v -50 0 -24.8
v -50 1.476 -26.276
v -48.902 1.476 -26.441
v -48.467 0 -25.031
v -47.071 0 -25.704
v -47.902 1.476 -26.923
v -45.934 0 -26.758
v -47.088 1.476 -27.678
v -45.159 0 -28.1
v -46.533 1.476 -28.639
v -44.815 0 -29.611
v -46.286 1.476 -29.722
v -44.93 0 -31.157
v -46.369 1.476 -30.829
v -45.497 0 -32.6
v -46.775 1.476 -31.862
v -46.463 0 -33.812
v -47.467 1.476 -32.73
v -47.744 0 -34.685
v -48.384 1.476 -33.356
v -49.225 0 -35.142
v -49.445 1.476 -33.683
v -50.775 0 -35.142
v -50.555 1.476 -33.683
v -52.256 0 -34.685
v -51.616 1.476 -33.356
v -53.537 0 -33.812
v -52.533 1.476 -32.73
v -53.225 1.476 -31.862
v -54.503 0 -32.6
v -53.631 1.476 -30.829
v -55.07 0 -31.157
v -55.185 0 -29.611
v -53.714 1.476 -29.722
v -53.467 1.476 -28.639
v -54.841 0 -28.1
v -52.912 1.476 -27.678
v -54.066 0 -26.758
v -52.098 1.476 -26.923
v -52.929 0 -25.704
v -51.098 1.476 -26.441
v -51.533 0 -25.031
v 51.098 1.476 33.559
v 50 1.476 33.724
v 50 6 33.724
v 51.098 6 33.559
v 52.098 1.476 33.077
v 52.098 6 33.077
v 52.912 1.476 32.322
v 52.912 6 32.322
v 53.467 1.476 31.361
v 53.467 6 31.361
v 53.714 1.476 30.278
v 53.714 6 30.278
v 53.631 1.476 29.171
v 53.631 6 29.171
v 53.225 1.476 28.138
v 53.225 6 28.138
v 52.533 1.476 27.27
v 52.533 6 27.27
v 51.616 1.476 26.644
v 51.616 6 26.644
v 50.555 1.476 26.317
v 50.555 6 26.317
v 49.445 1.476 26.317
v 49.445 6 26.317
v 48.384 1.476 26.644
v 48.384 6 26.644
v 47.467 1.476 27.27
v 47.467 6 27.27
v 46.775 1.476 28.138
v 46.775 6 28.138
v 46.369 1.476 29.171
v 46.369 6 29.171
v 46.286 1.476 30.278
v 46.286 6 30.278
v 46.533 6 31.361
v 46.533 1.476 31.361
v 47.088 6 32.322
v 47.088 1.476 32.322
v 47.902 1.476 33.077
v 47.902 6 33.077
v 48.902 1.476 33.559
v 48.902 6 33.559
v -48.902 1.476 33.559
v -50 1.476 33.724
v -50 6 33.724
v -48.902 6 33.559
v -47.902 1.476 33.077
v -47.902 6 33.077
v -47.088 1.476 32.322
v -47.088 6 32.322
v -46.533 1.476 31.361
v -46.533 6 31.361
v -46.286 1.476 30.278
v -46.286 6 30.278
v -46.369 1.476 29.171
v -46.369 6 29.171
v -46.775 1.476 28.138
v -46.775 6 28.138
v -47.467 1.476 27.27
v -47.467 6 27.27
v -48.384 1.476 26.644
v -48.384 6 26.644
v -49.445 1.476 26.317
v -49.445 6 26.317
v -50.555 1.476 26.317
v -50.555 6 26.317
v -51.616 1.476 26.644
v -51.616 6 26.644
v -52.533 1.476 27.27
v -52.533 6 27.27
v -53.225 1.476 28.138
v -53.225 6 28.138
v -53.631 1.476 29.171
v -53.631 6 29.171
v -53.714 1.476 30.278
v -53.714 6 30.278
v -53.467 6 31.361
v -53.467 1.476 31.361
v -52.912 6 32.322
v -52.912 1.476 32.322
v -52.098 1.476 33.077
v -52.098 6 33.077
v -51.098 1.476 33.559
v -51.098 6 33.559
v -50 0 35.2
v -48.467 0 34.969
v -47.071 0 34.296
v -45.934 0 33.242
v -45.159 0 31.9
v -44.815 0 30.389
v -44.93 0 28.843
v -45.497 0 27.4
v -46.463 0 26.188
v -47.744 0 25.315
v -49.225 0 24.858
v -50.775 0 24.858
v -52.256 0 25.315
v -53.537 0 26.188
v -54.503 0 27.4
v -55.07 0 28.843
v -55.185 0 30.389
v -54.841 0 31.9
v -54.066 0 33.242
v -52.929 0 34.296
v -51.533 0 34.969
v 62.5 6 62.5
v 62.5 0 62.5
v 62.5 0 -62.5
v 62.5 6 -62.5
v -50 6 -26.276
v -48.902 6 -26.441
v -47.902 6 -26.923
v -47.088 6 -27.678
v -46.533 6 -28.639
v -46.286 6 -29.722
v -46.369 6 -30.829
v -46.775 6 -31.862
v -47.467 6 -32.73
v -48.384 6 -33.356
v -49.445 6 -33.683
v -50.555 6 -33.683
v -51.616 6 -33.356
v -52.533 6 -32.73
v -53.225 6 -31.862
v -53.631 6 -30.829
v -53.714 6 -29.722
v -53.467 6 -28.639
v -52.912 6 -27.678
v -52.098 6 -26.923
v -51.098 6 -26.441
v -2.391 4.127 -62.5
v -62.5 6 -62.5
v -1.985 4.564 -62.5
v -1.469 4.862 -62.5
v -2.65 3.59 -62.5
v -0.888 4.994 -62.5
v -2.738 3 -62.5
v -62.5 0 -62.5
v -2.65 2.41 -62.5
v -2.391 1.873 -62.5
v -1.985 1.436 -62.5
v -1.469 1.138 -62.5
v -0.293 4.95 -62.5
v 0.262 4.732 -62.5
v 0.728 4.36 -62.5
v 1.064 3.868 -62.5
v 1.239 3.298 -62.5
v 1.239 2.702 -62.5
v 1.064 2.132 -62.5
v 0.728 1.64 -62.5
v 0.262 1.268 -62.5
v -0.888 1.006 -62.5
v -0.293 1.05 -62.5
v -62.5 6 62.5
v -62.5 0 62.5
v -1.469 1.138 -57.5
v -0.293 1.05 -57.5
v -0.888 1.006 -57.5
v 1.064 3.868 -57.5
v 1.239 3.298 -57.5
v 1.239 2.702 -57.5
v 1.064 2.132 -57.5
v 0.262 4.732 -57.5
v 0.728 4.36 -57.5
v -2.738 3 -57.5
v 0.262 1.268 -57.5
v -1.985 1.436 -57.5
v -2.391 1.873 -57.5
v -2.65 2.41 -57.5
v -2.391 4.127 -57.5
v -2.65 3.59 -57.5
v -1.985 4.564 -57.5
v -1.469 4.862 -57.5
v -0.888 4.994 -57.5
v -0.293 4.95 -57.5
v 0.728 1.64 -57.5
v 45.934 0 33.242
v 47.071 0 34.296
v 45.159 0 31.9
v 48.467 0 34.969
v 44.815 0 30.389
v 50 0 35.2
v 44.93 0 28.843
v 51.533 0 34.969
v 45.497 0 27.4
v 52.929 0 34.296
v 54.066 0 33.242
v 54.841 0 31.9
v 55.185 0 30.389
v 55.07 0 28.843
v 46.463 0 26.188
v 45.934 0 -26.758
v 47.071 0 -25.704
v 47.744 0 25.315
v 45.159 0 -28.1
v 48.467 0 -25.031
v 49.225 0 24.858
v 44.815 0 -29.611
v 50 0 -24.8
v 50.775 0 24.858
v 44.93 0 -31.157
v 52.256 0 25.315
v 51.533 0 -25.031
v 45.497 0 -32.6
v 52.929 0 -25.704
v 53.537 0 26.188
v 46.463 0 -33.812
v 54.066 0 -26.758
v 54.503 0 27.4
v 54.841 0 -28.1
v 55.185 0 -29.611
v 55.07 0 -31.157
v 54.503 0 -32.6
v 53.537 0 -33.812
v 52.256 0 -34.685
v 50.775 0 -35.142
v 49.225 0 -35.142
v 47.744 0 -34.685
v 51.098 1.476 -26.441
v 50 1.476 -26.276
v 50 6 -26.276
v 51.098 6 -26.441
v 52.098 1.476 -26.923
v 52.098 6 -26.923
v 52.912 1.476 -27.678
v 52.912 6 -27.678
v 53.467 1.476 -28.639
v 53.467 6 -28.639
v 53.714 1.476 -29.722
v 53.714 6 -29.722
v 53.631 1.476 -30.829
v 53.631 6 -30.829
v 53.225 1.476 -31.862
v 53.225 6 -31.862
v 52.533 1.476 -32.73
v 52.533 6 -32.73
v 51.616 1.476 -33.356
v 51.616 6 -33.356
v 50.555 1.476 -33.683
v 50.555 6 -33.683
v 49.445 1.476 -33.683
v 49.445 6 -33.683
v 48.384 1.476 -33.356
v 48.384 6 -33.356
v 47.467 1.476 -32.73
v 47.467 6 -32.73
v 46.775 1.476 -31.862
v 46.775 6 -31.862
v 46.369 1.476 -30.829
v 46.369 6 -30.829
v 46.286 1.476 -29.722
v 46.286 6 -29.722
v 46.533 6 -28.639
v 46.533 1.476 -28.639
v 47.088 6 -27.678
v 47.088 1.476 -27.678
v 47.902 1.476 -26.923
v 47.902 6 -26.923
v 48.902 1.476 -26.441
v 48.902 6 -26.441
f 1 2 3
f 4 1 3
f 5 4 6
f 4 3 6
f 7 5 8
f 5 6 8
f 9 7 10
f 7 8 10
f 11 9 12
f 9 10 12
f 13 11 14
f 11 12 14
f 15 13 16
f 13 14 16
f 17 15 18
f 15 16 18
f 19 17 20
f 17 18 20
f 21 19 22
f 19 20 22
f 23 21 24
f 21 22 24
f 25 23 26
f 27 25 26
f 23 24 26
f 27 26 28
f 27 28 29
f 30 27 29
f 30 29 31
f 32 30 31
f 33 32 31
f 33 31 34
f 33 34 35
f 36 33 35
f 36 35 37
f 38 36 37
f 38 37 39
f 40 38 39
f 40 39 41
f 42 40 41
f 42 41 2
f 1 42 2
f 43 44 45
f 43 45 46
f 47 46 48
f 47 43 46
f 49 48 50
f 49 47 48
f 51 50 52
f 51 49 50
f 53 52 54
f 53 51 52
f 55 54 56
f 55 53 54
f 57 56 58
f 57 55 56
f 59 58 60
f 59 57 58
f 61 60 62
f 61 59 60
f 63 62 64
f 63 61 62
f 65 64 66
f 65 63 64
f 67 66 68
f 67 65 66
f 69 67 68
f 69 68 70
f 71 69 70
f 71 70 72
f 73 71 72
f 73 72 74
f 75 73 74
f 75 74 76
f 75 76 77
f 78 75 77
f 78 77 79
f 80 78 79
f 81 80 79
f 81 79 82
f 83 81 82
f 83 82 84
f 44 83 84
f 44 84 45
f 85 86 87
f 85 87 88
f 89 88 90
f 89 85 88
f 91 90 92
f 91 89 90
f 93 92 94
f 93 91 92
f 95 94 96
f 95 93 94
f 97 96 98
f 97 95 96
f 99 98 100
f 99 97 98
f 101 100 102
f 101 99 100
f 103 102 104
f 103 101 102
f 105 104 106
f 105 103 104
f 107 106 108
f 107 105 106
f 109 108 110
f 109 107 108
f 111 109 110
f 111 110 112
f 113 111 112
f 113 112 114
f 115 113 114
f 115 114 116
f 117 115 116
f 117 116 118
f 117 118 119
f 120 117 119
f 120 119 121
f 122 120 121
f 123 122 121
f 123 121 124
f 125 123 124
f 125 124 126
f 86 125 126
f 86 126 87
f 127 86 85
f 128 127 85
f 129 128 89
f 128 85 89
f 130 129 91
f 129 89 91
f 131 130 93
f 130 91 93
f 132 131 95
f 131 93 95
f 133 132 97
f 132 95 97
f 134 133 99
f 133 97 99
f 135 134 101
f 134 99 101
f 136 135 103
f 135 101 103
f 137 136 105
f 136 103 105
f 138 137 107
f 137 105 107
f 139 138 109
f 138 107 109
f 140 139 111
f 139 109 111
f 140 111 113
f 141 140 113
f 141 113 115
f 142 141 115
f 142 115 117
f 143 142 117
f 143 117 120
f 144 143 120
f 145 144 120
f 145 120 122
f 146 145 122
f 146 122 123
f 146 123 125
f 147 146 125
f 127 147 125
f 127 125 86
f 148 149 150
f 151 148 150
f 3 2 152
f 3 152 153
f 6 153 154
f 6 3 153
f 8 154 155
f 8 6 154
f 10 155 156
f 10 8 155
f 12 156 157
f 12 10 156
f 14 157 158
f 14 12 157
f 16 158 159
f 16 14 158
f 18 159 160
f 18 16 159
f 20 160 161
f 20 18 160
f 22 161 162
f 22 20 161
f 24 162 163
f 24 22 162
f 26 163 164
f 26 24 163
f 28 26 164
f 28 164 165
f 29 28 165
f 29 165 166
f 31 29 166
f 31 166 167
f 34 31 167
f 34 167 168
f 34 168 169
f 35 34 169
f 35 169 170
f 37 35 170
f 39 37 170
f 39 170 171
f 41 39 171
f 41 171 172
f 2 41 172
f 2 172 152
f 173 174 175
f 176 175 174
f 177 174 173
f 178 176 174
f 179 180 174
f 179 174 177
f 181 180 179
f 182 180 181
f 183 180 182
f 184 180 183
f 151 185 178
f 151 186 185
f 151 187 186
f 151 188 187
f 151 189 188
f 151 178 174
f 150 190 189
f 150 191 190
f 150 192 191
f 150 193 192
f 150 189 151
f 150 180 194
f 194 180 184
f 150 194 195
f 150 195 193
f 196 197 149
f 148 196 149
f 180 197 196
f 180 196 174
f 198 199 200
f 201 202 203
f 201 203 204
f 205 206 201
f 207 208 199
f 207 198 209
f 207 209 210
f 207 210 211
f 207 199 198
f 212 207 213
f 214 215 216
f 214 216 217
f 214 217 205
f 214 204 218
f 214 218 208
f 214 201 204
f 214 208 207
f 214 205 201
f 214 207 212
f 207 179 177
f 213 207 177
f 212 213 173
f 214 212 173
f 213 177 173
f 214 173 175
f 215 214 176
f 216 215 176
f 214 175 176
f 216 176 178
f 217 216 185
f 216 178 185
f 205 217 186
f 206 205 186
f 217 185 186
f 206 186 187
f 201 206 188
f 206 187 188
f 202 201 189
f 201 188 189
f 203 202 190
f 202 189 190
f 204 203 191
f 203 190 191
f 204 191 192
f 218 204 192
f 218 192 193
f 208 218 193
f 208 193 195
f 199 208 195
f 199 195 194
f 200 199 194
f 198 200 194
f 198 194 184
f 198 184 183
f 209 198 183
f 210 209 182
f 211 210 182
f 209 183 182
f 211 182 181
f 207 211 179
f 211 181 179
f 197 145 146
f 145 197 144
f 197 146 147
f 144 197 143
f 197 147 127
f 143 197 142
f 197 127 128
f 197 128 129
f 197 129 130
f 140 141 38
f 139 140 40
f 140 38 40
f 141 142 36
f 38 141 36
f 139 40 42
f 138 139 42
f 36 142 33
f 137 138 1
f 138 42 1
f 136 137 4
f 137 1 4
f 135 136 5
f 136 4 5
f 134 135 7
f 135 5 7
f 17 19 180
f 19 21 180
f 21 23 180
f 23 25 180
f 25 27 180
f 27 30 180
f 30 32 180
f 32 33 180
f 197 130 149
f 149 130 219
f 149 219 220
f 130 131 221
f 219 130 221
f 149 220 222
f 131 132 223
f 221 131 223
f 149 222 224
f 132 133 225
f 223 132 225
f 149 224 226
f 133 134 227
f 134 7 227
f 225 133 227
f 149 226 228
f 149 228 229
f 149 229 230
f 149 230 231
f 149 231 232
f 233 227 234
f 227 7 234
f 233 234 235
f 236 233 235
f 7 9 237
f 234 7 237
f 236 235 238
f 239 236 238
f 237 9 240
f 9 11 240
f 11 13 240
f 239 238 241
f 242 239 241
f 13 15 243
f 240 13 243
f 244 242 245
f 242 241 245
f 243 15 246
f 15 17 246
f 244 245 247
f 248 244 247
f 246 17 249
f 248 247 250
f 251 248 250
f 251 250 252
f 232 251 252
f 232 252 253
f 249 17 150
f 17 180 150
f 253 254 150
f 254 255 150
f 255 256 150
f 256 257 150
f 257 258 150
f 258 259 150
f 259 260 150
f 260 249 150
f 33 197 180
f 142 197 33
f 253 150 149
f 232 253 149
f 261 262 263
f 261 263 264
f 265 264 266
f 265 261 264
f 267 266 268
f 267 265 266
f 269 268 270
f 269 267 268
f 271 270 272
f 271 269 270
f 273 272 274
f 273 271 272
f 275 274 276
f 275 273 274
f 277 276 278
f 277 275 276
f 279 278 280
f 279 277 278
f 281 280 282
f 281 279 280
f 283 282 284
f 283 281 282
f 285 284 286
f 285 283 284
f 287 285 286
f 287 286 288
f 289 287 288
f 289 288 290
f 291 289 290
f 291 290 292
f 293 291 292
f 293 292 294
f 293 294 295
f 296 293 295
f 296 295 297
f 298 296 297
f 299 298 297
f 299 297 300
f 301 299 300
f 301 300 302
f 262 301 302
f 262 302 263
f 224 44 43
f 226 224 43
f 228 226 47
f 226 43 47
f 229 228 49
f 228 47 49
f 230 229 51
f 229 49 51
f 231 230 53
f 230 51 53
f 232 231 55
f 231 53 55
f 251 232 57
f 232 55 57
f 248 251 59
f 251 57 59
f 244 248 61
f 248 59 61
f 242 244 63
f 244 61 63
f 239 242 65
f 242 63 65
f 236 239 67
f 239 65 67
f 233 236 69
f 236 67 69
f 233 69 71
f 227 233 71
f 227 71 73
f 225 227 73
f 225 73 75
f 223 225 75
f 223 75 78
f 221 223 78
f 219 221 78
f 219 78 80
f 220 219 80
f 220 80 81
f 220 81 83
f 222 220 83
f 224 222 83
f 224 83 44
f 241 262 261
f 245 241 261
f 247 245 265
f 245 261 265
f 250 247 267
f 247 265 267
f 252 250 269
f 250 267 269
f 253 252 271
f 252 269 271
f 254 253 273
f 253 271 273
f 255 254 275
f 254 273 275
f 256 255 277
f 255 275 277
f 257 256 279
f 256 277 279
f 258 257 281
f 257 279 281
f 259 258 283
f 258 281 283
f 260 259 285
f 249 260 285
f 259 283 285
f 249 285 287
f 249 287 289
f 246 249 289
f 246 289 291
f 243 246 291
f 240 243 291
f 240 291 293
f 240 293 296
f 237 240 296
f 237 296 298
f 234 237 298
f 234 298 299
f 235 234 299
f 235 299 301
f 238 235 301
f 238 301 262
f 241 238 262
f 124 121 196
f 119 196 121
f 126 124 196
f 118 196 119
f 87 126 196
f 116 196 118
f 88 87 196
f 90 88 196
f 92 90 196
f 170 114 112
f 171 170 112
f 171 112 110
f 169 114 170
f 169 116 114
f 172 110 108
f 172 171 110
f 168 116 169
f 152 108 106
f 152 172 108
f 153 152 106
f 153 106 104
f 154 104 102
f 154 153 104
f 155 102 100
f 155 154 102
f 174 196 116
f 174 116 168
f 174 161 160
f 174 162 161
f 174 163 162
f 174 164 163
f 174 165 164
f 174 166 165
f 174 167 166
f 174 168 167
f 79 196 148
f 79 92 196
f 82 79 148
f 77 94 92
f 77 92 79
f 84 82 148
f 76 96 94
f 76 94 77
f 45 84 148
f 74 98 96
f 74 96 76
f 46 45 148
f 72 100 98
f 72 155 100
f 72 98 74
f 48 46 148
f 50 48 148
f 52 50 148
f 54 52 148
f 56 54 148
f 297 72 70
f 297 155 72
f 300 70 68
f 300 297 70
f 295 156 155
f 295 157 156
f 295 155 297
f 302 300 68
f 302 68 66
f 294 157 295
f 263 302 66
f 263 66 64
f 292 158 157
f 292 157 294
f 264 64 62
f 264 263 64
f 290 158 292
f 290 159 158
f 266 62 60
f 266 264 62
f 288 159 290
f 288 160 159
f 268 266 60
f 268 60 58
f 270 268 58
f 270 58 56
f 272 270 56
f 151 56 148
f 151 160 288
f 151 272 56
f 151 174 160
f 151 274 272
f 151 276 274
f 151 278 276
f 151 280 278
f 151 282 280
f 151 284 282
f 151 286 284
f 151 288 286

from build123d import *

# Parameters (mm, degrees)
SKETCH1_W                                       = 125
SKETCH1_H                                       = 125
SKETCH1_R                                       = 3.724428854
BOSS_EXTRUDE2_DEPTH                             = 6
SKETCH3_R                                       = 2
CUT_EXTRUDE1_DEPTH                              = 5
CSK_FOR_M5_FLAT_HEAD_MACHINE_SCREW1_D           = 5.8
CSK_FOR_M5_FLAT_HEAD_MACHINE_SCREW1_DEPTH       = 6
CSK_FOR_M5_FLAT_HEAD_MACHINE_SCREW1_CSINK_D     = 10.4
CSK_FOR_M5_FLAT_HEAD_MACHINE_SCREW1_CSINK_ANGLE = 90
CSK_FOR_M5_FLAT_HEAD_MACHINE_SCREW1_TIP         = 1.742495795
CSK_FOR_M5_FLAT_HEAD_MACHINE_SCREW3_D           = 5.8
CSK_FOR_M5_FLAT_HEAD_MACHINE_SCREW3_DEPTH       = 6
CSK_FOR_M5_FLAT_HEAD_MACHINE_SCREW3_CSINK_D     = 10.4
CSK_FOR_M5_FLAT_HEAD_MACHINE_SCREW3_CSINK_ANGLE = 90
CSK_FOR_M5_FLAT_HEAD_MACHINE_SCREW3_TIP         = 1.742495795
CSK_FOR_M5_FLAT_HEAD_MACHINE_SCREW4_D           = 5.8
CSK_FOR_M5_FLAT_HEAD_MACHINE_SCREW4_DEPTH       = 6
CSK_FOR_M5_FLAT_HEAD_MACHINE_SCREW4_CSINK_D     = 10.4
CSK_FOR_M5_FLAT_HEAD_MACHINE_SCREW4_CSINK_ANGLE = 90
CSK_FOR_M5_FLAT_HEAD_MACHINE_SCREW4_TIP         = 1.742495795
CSK_FOR_M5_FLAT_HEAD_MACHINE_SCREW5_D           = 5.8
CSK_FOR_M5_FLAT_HEAD_MACHINE_SCREW5_DEPTH       = 6
CSK_FOR_M5_FLAT_HEAD_MACHINE_SCREW5_CSINK_D     = 10.4
CSK_FOR_M5_FLAT_HEAD_MACHINE_SCREW5_CSINK_ANGLE = 90
CSK_FOR_M5_FLAT_HEAD_MACHINE_SCREW5_TIP         = 1.742495795


with BuildPart() as part:
    # Sketch1 → Boss-Extrude2 (new body)
    with BuildSketch(Plane(origin=(0, 0, 0), x_dir=(1, 0, 0), z_dir=(0, 1, 0))):
        Rectangle(SKETCH1_W, SKETCH1_H)
        with Locations(Location((50, 30, 0), (0, 0, 270))):
            Circle(SKETCH1_R, mode=Mode.SUBTRACT)
        with Locations(Location((-50, 30, 0), (0, 0, 270))):
            Circle(SKETCH1_R, mode=Mode.SUBTRACT)
        with Locations(Location((-50, -30, 0), (0, 0, 270))):
            Circle(SKETCH1_R, mode=Mode.SUBTRACT)
        with Locations(Location((50, -30, 0), (0, 0, 270))):
            Circle(SKETCH1_R, mode=Mode.SUBTRACT)
    extrude(amount=BOSS_EXTRUDE2_DEPTH)

    # Sketch3 → Cut-Extrude1 (cut)
    with BuildSketch(Plane(origin=(0, 0, -62.5), x_dir=(-1, 0, 0), z_dir=(0, 0, -1))):
        with Locations((0.738370199, 3)):
            Circle(SKETCH3_R)
    extrude(amount=-CUT_EXTRUDE1_DEPTH, mode=Mode.SUBTRACT)

    # CSK for M5 Flat Head Machine Screw1
    with Locations(Plane(origin=(50, 0, -30), x_dir=(0, 0, -1), z_dir=(0, -1, 0))):
        with Locations((0, 0)):
            CounterSinkHole(CSK_FOR_M5_FLAT_HEAD_MACHINE_SCREW1_D / 2, CSK_FOR_M5_FLAT_HEAD_MACHINE_SCREW1_CSINK_D / 2, depth=CSK_FOR_M5_FLAT_HEAD_MACHINE_SCREW1_DEPTH, counter_sink_angle=CSK_FOR_M5_FLAT_HEAD_MACHINE_SCREW1_CSINK_ANGLE)
            with Locations((0, 0, -(CSK_FOR_M5_FLAT_HEAD_MACHINE_SCREW1_DEPTH + CSK_FOR_M5_FLAT_HEAD_MACHINE_SCREW1_TIP / 2))):  # 118° drill point
                Cone(0, CSK_FOR_M5_FLAT_HEAD_MACHINE_SCREW1_D / 2, CSK_FOR_M5_FLAT_HEAD_MACHINE_SCREW1_TIP, mode=Mode.SUBTRACT)

    # CSK for M5 Flat Head Machine Screw3
    with Locations(Plane(origin=(-50, 0, -30), x_dir=(0, 0, -1), z_dir=(0, -1, 0))):
        with Locations((0, 0)):
            CounterSinkHole(CSK_FOR_M5_FLAT_HEAD_MACHINE_SCREW3_D / 2, CSK_FOR_M5_FLAT_HEAD_MACHINE_SCREW3_CSINK_D / 2, depth=CSK_FOR_M5_FLAT_HEAD_MACHINE_SCREW3_DEPTH, counter_sink_angle=CSK_FOR_M5_FLAT_HEAD_MACHINE_SCREW3_CSINK_ANGLE)
            with Locations((0, 0, -(CSK_FOR_M5_FLAT_HEAD_MACHINE_SCREW3_DEPTH + CSK_FOR_M5_FLAT_HEAD_MACHINE_SCREW3_TIP / 2))):  # 118° drill point
                Cone(0, CSK_FOR_M5_FLAT_HEAD_MACHINE_SCREW3_D / 2, CSK_FOR_M5_FLAT_HEAD_MACHINE_SCREW3_TIP, mode=Mode.SUBTRACT)

    # CSK for M5 Flat Head Machine Screw4
    with Locations(Plane(origin=(-50, 0, 30), x_dir=(0, 0, -1), z_dir=(0, -1, 0))):
        with Locations((0, 0)):
            CounterSinkHole(CSK_FOR_M5_FLAT_HEAD_MACHINE_SCREW4_D / 2, CSK_FOR_M5_FLAT_HEAD_MACHINE_SCREW4_CSINK_D / 2, depth=CSK_FOR_M5_FLAT_HEAD_MACHINE_SCREW4_DEPTH, counter_sink_angle=CSK_FOR_M5_FLAT_HEAD_MACHINE_SCREW4_CSINK_ANGLE)
            with Locations((0, 0, -(CSK_FOR_M5_FLAT_HEAD_MACHINE_SCREW4_DEPTH + CSK_FOR_M5_FLAT_HEAD_MACHINE_SCREW4_TIP / 2))):  # 118° drill point
                Cone(0, CSK_FOR_M5_FLAT_HEAD_MACHINE_SCREW4_D / 2, CSK_FOR_M5_FLAT_HEAD_MACHINE_SCREW4_TIP, mode=Mode.SUBTRACT)

    # CSK for M5 Flat Head Machine Screw5
    with Locations(Plane(origin=(50, 0, 30), x_dir=(0, 0, -1), z_dir=(0, -1, 0))):
        with Locations((0, 0)):
            CounterSinkHole(CSK_FOR_M5_FLAT_HEAD_MACHINE_SCREW5_D / 2, CSK_FOR_M5_FLAT_HEAD_MACHINE_SCREW5_CSINK_D / 2, depth=CSK_FOR_M5_FLAT_HEAD_MACHINE_SCREW5_DEPTH, counter_sink_angle=CSK_FOR_M5_FLAT_HEAD_MACHINE_SCREW5_CSINK_ANGLE)
            with Locations((0, 0, -(CSK_FOR_M5_FLAT_HEAD_MACHINE_SCREW5_DEPTH + CSK_FOR_M5_FLAT_HEAD_MACHINE_SCREW5_TIP / 2))):  # 118° drill point
                Cone(0, CSK_FOR_M5_FLAT_HEAD_MACHINE_SCREW5_D / 2, CSK_FOR_M5_FLAT_HEAD_MACHINE_SCREW5_TIP, mode=Mode.SUBTRACT)


solid = part.part
